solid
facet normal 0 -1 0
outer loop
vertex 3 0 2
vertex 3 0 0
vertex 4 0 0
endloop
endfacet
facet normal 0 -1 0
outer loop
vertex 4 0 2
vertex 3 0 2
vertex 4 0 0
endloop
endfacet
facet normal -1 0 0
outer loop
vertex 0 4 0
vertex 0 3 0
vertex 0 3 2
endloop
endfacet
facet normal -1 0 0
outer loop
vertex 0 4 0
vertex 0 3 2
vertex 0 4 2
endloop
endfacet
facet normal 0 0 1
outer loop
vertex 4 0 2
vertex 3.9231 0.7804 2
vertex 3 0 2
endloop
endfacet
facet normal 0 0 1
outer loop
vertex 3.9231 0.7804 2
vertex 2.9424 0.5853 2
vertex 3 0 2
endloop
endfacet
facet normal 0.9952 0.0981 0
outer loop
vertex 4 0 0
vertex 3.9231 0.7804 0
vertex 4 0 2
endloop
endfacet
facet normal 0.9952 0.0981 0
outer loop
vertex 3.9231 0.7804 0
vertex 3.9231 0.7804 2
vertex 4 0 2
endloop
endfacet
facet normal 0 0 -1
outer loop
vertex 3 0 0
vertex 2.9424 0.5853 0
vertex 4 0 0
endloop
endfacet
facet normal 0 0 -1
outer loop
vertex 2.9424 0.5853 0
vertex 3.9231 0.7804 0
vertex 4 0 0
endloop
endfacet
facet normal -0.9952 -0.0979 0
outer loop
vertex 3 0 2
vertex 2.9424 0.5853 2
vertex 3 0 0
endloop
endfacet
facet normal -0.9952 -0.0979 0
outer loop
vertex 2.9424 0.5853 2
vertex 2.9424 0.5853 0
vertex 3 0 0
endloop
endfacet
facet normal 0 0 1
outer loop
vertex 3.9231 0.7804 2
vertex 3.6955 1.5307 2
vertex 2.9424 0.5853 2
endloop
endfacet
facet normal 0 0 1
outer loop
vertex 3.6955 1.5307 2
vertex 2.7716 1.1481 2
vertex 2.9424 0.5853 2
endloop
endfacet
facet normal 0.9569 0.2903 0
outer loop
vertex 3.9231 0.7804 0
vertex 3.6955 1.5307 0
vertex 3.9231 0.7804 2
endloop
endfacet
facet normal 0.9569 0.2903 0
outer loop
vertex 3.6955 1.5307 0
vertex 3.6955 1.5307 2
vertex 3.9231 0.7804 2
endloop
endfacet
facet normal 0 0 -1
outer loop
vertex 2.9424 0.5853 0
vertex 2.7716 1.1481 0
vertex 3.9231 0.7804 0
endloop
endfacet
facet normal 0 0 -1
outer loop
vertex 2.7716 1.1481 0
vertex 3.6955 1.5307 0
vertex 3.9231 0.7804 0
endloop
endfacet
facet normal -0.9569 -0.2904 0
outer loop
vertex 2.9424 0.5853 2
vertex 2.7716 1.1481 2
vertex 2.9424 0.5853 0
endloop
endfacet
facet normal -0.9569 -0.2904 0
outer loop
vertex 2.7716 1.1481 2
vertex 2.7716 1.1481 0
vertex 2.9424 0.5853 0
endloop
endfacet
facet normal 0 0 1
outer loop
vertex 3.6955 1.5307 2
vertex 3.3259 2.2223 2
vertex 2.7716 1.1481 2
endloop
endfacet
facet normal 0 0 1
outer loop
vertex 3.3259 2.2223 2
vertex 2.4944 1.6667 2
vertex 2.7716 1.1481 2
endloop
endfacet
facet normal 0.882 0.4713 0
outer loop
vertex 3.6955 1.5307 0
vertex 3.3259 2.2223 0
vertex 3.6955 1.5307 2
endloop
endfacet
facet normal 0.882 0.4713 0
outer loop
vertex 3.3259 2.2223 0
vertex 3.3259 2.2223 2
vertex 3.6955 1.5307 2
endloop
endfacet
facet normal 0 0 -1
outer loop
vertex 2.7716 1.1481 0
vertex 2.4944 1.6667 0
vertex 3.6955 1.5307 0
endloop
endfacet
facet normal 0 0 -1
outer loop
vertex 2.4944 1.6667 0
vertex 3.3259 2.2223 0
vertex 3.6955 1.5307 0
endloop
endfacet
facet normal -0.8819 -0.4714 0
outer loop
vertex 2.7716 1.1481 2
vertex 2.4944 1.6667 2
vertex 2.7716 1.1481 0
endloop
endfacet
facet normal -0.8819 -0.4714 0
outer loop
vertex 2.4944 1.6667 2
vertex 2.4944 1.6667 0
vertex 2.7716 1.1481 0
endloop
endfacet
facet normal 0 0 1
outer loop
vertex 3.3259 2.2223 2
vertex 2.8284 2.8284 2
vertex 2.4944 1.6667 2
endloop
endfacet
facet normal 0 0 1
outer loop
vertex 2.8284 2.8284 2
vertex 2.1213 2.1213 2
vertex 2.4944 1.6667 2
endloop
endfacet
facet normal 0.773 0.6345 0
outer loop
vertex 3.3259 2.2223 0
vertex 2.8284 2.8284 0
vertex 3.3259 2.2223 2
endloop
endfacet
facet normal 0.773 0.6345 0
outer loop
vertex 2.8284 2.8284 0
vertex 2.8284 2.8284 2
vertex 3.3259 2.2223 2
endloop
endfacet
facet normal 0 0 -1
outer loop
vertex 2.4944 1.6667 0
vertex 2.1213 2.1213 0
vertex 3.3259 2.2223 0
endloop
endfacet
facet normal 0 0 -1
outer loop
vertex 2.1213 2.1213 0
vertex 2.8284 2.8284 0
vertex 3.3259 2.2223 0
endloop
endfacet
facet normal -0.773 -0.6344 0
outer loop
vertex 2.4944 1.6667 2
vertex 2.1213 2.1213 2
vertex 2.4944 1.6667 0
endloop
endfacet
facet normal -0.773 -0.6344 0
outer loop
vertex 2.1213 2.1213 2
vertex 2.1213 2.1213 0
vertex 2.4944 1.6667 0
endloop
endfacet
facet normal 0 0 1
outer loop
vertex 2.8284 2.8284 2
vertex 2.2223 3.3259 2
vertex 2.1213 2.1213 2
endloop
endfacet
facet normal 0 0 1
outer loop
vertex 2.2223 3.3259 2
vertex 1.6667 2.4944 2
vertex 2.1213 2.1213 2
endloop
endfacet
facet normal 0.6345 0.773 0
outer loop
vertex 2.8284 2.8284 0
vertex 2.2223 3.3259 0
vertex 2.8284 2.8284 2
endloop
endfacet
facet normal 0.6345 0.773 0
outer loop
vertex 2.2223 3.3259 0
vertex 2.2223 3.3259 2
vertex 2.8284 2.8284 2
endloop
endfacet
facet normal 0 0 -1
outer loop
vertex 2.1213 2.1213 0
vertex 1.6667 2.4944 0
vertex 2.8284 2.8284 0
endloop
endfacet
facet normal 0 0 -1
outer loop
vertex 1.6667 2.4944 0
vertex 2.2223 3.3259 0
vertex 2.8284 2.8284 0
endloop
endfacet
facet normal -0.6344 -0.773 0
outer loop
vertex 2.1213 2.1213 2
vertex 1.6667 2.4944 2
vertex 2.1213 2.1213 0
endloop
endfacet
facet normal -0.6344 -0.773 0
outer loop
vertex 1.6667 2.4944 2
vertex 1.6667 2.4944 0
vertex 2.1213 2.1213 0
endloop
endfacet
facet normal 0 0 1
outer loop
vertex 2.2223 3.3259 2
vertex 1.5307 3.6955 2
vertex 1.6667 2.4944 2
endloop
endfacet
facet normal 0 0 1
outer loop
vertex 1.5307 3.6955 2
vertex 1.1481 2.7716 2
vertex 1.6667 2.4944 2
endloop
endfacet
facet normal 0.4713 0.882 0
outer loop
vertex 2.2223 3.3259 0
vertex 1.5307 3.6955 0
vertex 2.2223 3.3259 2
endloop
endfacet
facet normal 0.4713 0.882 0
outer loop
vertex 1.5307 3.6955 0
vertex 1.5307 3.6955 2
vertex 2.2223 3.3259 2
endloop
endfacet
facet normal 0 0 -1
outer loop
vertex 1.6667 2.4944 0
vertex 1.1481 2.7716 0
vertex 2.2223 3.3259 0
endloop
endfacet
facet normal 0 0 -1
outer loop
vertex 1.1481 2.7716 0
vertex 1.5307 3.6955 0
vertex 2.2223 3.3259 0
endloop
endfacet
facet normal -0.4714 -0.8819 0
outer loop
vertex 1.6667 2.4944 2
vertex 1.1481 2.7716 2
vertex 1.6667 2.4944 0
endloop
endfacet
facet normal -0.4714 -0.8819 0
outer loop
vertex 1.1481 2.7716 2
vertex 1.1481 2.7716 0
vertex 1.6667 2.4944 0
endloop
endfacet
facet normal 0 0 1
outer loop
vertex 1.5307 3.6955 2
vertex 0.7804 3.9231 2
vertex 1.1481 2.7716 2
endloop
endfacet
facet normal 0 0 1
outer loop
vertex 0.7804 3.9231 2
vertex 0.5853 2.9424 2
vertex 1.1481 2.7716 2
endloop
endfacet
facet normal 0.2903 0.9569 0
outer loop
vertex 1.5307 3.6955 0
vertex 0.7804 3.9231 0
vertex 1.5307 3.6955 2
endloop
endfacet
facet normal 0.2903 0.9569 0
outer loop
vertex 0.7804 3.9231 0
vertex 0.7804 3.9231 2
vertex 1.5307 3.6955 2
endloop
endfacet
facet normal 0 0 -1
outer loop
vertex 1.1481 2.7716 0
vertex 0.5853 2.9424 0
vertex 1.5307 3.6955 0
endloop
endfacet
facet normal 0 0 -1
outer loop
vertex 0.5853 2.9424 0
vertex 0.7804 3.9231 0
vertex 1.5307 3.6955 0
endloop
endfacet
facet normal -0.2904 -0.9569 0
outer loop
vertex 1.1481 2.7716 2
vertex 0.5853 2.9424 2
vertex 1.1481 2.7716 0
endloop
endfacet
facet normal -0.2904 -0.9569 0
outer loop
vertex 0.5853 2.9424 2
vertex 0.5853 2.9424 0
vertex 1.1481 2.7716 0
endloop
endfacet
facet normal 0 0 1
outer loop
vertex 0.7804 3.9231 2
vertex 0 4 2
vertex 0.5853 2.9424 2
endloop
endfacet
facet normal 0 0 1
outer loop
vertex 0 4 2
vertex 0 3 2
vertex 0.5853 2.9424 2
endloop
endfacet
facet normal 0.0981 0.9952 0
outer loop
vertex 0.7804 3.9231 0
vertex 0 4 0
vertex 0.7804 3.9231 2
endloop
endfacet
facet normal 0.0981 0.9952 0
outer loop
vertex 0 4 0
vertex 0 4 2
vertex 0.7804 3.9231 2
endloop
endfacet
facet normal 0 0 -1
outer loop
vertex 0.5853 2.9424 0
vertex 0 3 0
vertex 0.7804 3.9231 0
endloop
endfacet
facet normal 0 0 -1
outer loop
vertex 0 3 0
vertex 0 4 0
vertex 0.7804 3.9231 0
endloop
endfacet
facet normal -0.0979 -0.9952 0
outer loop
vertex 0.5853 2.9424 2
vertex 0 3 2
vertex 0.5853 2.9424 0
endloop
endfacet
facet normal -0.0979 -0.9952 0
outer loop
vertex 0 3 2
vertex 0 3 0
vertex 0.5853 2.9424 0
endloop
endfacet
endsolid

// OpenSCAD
// partial revolution
rotate_extrude(angle = 90, $fn = 32) translate([3, 0]) square([1, 2]);
